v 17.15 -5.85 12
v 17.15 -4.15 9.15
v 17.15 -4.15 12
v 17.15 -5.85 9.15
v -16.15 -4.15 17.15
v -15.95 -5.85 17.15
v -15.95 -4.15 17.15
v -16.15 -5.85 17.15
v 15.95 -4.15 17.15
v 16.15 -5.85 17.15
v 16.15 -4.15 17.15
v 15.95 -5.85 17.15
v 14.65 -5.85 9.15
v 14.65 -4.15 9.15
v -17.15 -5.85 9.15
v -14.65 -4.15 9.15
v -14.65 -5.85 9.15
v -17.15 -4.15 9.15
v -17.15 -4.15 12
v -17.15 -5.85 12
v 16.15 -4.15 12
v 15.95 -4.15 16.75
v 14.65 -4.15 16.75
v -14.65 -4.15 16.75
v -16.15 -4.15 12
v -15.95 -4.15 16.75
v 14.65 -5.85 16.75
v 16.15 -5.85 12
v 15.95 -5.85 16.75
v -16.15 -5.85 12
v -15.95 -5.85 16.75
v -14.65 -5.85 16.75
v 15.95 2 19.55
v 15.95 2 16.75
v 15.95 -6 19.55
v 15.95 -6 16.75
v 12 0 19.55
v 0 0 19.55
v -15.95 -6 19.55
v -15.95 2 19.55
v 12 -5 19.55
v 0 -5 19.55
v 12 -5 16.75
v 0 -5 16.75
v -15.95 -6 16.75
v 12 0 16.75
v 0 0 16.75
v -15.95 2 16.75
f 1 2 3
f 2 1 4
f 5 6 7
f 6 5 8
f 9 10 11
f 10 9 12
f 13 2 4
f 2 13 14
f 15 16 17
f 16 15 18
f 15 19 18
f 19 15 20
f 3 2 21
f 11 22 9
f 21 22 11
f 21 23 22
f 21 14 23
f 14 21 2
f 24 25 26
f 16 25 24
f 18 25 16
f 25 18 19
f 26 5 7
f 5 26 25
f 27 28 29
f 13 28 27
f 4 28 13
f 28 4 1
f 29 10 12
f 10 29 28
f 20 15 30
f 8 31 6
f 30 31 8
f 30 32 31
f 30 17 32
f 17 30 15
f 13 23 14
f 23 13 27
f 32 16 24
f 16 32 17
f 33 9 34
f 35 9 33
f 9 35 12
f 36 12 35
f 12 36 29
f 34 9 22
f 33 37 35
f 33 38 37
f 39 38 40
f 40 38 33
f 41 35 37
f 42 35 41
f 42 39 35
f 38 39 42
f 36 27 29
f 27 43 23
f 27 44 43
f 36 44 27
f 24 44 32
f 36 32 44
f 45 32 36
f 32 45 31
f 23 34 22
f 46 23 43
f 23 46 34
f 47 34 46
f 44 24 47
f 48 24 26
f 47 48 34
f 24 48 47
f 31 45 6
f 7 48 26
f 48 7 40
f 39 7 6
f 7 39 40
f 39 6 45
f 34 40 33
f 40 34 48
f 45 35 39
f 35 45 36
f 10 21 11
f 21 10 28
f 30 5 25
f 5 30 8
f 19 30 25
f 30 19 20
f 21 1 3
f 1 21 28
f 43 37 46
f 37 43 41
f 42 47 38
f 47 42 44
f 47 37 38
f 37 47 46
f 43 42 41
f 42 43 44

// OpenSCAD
// file: usb_screen.scad
//长宽高
ma=32.3;//横着
mb=34.3;//竖着
mc=4.2;//厚度

l1=1.6;//屏幕顶部
l2=2;//两边
l3=4.8;//屏幕底部

ll=3;//默认槽宽


difference()
{
    cube([ma+4,mc+4,mb+5],true);
    union()
    {
        cube([ma,mc,mb],true);//中间的空间
        translate([0,0,-1.5])//屏幕排线
            cube([ma-10,mc,mb],true);
        
        translate([0,3,0])//前面扣洞
            cube([ma-l2*2,mc,mb-l3*2],true);
        translate([0,3,mb/4])//前面再扣洞
            cube([ma-l2*2,mc,mb/2-l2*2],true);
        translate([0,-3,0])//背面扣洞
            cube([ma-ll,mc,mb-ll],true);
        
        translate([0,0,5])//上面扣洞
            cube([ma,mc,mb],true);
        translate([0,-3,10])//去掉一个梁
            cube([ma-ll,mc,mb-ll],true);

        translate([0,-3,mb/2+1])//做个槽放盖子
            cube([ma,mc,3.2],true);
    }
}
translate([0,-7.5,0])//背面
    cube([ma+4,2,mb+5],true);

difference()
{
    translate([0,-5,0])//背面
        cube([ma+4,3,mb+5],true);
    translate([0,-5,0])//背面
    union()
    {
        translate([0,0,5])//上面扣洞
            cube([ma,mc,mb+10],true);
        translate([0,0,10])//卡扣
            cube([ma+5,4,4],true);
    }
}
// main file
//长宽高
ma=32.3;//横着
mb=34.3;//竖着
mc=4.2;//厚度

l1=1.6;//屏幕顶部
l2=2;//两边
l3=4.8;//屏幕底部

ll=3;//默认槽宽


difference()
{
    union()
    {
        translate([0,-2,mb/2+1])
            cube([ma-0.4,mc+4-0.2,2.8],true);
        difference()
        {
            translate([0,-5,mb/2-4])
                cube([ma+2,1.7,8],true);
            translate([0,-5,mb/2-4])
                cube([ma-3,1.8,8.2],true);
        }
    }
    union()
    {
        include<usb_screen.scad>;
        translate([6,-2.5,5])
            cube([12,5,mb],true);//usb口
    }
}
